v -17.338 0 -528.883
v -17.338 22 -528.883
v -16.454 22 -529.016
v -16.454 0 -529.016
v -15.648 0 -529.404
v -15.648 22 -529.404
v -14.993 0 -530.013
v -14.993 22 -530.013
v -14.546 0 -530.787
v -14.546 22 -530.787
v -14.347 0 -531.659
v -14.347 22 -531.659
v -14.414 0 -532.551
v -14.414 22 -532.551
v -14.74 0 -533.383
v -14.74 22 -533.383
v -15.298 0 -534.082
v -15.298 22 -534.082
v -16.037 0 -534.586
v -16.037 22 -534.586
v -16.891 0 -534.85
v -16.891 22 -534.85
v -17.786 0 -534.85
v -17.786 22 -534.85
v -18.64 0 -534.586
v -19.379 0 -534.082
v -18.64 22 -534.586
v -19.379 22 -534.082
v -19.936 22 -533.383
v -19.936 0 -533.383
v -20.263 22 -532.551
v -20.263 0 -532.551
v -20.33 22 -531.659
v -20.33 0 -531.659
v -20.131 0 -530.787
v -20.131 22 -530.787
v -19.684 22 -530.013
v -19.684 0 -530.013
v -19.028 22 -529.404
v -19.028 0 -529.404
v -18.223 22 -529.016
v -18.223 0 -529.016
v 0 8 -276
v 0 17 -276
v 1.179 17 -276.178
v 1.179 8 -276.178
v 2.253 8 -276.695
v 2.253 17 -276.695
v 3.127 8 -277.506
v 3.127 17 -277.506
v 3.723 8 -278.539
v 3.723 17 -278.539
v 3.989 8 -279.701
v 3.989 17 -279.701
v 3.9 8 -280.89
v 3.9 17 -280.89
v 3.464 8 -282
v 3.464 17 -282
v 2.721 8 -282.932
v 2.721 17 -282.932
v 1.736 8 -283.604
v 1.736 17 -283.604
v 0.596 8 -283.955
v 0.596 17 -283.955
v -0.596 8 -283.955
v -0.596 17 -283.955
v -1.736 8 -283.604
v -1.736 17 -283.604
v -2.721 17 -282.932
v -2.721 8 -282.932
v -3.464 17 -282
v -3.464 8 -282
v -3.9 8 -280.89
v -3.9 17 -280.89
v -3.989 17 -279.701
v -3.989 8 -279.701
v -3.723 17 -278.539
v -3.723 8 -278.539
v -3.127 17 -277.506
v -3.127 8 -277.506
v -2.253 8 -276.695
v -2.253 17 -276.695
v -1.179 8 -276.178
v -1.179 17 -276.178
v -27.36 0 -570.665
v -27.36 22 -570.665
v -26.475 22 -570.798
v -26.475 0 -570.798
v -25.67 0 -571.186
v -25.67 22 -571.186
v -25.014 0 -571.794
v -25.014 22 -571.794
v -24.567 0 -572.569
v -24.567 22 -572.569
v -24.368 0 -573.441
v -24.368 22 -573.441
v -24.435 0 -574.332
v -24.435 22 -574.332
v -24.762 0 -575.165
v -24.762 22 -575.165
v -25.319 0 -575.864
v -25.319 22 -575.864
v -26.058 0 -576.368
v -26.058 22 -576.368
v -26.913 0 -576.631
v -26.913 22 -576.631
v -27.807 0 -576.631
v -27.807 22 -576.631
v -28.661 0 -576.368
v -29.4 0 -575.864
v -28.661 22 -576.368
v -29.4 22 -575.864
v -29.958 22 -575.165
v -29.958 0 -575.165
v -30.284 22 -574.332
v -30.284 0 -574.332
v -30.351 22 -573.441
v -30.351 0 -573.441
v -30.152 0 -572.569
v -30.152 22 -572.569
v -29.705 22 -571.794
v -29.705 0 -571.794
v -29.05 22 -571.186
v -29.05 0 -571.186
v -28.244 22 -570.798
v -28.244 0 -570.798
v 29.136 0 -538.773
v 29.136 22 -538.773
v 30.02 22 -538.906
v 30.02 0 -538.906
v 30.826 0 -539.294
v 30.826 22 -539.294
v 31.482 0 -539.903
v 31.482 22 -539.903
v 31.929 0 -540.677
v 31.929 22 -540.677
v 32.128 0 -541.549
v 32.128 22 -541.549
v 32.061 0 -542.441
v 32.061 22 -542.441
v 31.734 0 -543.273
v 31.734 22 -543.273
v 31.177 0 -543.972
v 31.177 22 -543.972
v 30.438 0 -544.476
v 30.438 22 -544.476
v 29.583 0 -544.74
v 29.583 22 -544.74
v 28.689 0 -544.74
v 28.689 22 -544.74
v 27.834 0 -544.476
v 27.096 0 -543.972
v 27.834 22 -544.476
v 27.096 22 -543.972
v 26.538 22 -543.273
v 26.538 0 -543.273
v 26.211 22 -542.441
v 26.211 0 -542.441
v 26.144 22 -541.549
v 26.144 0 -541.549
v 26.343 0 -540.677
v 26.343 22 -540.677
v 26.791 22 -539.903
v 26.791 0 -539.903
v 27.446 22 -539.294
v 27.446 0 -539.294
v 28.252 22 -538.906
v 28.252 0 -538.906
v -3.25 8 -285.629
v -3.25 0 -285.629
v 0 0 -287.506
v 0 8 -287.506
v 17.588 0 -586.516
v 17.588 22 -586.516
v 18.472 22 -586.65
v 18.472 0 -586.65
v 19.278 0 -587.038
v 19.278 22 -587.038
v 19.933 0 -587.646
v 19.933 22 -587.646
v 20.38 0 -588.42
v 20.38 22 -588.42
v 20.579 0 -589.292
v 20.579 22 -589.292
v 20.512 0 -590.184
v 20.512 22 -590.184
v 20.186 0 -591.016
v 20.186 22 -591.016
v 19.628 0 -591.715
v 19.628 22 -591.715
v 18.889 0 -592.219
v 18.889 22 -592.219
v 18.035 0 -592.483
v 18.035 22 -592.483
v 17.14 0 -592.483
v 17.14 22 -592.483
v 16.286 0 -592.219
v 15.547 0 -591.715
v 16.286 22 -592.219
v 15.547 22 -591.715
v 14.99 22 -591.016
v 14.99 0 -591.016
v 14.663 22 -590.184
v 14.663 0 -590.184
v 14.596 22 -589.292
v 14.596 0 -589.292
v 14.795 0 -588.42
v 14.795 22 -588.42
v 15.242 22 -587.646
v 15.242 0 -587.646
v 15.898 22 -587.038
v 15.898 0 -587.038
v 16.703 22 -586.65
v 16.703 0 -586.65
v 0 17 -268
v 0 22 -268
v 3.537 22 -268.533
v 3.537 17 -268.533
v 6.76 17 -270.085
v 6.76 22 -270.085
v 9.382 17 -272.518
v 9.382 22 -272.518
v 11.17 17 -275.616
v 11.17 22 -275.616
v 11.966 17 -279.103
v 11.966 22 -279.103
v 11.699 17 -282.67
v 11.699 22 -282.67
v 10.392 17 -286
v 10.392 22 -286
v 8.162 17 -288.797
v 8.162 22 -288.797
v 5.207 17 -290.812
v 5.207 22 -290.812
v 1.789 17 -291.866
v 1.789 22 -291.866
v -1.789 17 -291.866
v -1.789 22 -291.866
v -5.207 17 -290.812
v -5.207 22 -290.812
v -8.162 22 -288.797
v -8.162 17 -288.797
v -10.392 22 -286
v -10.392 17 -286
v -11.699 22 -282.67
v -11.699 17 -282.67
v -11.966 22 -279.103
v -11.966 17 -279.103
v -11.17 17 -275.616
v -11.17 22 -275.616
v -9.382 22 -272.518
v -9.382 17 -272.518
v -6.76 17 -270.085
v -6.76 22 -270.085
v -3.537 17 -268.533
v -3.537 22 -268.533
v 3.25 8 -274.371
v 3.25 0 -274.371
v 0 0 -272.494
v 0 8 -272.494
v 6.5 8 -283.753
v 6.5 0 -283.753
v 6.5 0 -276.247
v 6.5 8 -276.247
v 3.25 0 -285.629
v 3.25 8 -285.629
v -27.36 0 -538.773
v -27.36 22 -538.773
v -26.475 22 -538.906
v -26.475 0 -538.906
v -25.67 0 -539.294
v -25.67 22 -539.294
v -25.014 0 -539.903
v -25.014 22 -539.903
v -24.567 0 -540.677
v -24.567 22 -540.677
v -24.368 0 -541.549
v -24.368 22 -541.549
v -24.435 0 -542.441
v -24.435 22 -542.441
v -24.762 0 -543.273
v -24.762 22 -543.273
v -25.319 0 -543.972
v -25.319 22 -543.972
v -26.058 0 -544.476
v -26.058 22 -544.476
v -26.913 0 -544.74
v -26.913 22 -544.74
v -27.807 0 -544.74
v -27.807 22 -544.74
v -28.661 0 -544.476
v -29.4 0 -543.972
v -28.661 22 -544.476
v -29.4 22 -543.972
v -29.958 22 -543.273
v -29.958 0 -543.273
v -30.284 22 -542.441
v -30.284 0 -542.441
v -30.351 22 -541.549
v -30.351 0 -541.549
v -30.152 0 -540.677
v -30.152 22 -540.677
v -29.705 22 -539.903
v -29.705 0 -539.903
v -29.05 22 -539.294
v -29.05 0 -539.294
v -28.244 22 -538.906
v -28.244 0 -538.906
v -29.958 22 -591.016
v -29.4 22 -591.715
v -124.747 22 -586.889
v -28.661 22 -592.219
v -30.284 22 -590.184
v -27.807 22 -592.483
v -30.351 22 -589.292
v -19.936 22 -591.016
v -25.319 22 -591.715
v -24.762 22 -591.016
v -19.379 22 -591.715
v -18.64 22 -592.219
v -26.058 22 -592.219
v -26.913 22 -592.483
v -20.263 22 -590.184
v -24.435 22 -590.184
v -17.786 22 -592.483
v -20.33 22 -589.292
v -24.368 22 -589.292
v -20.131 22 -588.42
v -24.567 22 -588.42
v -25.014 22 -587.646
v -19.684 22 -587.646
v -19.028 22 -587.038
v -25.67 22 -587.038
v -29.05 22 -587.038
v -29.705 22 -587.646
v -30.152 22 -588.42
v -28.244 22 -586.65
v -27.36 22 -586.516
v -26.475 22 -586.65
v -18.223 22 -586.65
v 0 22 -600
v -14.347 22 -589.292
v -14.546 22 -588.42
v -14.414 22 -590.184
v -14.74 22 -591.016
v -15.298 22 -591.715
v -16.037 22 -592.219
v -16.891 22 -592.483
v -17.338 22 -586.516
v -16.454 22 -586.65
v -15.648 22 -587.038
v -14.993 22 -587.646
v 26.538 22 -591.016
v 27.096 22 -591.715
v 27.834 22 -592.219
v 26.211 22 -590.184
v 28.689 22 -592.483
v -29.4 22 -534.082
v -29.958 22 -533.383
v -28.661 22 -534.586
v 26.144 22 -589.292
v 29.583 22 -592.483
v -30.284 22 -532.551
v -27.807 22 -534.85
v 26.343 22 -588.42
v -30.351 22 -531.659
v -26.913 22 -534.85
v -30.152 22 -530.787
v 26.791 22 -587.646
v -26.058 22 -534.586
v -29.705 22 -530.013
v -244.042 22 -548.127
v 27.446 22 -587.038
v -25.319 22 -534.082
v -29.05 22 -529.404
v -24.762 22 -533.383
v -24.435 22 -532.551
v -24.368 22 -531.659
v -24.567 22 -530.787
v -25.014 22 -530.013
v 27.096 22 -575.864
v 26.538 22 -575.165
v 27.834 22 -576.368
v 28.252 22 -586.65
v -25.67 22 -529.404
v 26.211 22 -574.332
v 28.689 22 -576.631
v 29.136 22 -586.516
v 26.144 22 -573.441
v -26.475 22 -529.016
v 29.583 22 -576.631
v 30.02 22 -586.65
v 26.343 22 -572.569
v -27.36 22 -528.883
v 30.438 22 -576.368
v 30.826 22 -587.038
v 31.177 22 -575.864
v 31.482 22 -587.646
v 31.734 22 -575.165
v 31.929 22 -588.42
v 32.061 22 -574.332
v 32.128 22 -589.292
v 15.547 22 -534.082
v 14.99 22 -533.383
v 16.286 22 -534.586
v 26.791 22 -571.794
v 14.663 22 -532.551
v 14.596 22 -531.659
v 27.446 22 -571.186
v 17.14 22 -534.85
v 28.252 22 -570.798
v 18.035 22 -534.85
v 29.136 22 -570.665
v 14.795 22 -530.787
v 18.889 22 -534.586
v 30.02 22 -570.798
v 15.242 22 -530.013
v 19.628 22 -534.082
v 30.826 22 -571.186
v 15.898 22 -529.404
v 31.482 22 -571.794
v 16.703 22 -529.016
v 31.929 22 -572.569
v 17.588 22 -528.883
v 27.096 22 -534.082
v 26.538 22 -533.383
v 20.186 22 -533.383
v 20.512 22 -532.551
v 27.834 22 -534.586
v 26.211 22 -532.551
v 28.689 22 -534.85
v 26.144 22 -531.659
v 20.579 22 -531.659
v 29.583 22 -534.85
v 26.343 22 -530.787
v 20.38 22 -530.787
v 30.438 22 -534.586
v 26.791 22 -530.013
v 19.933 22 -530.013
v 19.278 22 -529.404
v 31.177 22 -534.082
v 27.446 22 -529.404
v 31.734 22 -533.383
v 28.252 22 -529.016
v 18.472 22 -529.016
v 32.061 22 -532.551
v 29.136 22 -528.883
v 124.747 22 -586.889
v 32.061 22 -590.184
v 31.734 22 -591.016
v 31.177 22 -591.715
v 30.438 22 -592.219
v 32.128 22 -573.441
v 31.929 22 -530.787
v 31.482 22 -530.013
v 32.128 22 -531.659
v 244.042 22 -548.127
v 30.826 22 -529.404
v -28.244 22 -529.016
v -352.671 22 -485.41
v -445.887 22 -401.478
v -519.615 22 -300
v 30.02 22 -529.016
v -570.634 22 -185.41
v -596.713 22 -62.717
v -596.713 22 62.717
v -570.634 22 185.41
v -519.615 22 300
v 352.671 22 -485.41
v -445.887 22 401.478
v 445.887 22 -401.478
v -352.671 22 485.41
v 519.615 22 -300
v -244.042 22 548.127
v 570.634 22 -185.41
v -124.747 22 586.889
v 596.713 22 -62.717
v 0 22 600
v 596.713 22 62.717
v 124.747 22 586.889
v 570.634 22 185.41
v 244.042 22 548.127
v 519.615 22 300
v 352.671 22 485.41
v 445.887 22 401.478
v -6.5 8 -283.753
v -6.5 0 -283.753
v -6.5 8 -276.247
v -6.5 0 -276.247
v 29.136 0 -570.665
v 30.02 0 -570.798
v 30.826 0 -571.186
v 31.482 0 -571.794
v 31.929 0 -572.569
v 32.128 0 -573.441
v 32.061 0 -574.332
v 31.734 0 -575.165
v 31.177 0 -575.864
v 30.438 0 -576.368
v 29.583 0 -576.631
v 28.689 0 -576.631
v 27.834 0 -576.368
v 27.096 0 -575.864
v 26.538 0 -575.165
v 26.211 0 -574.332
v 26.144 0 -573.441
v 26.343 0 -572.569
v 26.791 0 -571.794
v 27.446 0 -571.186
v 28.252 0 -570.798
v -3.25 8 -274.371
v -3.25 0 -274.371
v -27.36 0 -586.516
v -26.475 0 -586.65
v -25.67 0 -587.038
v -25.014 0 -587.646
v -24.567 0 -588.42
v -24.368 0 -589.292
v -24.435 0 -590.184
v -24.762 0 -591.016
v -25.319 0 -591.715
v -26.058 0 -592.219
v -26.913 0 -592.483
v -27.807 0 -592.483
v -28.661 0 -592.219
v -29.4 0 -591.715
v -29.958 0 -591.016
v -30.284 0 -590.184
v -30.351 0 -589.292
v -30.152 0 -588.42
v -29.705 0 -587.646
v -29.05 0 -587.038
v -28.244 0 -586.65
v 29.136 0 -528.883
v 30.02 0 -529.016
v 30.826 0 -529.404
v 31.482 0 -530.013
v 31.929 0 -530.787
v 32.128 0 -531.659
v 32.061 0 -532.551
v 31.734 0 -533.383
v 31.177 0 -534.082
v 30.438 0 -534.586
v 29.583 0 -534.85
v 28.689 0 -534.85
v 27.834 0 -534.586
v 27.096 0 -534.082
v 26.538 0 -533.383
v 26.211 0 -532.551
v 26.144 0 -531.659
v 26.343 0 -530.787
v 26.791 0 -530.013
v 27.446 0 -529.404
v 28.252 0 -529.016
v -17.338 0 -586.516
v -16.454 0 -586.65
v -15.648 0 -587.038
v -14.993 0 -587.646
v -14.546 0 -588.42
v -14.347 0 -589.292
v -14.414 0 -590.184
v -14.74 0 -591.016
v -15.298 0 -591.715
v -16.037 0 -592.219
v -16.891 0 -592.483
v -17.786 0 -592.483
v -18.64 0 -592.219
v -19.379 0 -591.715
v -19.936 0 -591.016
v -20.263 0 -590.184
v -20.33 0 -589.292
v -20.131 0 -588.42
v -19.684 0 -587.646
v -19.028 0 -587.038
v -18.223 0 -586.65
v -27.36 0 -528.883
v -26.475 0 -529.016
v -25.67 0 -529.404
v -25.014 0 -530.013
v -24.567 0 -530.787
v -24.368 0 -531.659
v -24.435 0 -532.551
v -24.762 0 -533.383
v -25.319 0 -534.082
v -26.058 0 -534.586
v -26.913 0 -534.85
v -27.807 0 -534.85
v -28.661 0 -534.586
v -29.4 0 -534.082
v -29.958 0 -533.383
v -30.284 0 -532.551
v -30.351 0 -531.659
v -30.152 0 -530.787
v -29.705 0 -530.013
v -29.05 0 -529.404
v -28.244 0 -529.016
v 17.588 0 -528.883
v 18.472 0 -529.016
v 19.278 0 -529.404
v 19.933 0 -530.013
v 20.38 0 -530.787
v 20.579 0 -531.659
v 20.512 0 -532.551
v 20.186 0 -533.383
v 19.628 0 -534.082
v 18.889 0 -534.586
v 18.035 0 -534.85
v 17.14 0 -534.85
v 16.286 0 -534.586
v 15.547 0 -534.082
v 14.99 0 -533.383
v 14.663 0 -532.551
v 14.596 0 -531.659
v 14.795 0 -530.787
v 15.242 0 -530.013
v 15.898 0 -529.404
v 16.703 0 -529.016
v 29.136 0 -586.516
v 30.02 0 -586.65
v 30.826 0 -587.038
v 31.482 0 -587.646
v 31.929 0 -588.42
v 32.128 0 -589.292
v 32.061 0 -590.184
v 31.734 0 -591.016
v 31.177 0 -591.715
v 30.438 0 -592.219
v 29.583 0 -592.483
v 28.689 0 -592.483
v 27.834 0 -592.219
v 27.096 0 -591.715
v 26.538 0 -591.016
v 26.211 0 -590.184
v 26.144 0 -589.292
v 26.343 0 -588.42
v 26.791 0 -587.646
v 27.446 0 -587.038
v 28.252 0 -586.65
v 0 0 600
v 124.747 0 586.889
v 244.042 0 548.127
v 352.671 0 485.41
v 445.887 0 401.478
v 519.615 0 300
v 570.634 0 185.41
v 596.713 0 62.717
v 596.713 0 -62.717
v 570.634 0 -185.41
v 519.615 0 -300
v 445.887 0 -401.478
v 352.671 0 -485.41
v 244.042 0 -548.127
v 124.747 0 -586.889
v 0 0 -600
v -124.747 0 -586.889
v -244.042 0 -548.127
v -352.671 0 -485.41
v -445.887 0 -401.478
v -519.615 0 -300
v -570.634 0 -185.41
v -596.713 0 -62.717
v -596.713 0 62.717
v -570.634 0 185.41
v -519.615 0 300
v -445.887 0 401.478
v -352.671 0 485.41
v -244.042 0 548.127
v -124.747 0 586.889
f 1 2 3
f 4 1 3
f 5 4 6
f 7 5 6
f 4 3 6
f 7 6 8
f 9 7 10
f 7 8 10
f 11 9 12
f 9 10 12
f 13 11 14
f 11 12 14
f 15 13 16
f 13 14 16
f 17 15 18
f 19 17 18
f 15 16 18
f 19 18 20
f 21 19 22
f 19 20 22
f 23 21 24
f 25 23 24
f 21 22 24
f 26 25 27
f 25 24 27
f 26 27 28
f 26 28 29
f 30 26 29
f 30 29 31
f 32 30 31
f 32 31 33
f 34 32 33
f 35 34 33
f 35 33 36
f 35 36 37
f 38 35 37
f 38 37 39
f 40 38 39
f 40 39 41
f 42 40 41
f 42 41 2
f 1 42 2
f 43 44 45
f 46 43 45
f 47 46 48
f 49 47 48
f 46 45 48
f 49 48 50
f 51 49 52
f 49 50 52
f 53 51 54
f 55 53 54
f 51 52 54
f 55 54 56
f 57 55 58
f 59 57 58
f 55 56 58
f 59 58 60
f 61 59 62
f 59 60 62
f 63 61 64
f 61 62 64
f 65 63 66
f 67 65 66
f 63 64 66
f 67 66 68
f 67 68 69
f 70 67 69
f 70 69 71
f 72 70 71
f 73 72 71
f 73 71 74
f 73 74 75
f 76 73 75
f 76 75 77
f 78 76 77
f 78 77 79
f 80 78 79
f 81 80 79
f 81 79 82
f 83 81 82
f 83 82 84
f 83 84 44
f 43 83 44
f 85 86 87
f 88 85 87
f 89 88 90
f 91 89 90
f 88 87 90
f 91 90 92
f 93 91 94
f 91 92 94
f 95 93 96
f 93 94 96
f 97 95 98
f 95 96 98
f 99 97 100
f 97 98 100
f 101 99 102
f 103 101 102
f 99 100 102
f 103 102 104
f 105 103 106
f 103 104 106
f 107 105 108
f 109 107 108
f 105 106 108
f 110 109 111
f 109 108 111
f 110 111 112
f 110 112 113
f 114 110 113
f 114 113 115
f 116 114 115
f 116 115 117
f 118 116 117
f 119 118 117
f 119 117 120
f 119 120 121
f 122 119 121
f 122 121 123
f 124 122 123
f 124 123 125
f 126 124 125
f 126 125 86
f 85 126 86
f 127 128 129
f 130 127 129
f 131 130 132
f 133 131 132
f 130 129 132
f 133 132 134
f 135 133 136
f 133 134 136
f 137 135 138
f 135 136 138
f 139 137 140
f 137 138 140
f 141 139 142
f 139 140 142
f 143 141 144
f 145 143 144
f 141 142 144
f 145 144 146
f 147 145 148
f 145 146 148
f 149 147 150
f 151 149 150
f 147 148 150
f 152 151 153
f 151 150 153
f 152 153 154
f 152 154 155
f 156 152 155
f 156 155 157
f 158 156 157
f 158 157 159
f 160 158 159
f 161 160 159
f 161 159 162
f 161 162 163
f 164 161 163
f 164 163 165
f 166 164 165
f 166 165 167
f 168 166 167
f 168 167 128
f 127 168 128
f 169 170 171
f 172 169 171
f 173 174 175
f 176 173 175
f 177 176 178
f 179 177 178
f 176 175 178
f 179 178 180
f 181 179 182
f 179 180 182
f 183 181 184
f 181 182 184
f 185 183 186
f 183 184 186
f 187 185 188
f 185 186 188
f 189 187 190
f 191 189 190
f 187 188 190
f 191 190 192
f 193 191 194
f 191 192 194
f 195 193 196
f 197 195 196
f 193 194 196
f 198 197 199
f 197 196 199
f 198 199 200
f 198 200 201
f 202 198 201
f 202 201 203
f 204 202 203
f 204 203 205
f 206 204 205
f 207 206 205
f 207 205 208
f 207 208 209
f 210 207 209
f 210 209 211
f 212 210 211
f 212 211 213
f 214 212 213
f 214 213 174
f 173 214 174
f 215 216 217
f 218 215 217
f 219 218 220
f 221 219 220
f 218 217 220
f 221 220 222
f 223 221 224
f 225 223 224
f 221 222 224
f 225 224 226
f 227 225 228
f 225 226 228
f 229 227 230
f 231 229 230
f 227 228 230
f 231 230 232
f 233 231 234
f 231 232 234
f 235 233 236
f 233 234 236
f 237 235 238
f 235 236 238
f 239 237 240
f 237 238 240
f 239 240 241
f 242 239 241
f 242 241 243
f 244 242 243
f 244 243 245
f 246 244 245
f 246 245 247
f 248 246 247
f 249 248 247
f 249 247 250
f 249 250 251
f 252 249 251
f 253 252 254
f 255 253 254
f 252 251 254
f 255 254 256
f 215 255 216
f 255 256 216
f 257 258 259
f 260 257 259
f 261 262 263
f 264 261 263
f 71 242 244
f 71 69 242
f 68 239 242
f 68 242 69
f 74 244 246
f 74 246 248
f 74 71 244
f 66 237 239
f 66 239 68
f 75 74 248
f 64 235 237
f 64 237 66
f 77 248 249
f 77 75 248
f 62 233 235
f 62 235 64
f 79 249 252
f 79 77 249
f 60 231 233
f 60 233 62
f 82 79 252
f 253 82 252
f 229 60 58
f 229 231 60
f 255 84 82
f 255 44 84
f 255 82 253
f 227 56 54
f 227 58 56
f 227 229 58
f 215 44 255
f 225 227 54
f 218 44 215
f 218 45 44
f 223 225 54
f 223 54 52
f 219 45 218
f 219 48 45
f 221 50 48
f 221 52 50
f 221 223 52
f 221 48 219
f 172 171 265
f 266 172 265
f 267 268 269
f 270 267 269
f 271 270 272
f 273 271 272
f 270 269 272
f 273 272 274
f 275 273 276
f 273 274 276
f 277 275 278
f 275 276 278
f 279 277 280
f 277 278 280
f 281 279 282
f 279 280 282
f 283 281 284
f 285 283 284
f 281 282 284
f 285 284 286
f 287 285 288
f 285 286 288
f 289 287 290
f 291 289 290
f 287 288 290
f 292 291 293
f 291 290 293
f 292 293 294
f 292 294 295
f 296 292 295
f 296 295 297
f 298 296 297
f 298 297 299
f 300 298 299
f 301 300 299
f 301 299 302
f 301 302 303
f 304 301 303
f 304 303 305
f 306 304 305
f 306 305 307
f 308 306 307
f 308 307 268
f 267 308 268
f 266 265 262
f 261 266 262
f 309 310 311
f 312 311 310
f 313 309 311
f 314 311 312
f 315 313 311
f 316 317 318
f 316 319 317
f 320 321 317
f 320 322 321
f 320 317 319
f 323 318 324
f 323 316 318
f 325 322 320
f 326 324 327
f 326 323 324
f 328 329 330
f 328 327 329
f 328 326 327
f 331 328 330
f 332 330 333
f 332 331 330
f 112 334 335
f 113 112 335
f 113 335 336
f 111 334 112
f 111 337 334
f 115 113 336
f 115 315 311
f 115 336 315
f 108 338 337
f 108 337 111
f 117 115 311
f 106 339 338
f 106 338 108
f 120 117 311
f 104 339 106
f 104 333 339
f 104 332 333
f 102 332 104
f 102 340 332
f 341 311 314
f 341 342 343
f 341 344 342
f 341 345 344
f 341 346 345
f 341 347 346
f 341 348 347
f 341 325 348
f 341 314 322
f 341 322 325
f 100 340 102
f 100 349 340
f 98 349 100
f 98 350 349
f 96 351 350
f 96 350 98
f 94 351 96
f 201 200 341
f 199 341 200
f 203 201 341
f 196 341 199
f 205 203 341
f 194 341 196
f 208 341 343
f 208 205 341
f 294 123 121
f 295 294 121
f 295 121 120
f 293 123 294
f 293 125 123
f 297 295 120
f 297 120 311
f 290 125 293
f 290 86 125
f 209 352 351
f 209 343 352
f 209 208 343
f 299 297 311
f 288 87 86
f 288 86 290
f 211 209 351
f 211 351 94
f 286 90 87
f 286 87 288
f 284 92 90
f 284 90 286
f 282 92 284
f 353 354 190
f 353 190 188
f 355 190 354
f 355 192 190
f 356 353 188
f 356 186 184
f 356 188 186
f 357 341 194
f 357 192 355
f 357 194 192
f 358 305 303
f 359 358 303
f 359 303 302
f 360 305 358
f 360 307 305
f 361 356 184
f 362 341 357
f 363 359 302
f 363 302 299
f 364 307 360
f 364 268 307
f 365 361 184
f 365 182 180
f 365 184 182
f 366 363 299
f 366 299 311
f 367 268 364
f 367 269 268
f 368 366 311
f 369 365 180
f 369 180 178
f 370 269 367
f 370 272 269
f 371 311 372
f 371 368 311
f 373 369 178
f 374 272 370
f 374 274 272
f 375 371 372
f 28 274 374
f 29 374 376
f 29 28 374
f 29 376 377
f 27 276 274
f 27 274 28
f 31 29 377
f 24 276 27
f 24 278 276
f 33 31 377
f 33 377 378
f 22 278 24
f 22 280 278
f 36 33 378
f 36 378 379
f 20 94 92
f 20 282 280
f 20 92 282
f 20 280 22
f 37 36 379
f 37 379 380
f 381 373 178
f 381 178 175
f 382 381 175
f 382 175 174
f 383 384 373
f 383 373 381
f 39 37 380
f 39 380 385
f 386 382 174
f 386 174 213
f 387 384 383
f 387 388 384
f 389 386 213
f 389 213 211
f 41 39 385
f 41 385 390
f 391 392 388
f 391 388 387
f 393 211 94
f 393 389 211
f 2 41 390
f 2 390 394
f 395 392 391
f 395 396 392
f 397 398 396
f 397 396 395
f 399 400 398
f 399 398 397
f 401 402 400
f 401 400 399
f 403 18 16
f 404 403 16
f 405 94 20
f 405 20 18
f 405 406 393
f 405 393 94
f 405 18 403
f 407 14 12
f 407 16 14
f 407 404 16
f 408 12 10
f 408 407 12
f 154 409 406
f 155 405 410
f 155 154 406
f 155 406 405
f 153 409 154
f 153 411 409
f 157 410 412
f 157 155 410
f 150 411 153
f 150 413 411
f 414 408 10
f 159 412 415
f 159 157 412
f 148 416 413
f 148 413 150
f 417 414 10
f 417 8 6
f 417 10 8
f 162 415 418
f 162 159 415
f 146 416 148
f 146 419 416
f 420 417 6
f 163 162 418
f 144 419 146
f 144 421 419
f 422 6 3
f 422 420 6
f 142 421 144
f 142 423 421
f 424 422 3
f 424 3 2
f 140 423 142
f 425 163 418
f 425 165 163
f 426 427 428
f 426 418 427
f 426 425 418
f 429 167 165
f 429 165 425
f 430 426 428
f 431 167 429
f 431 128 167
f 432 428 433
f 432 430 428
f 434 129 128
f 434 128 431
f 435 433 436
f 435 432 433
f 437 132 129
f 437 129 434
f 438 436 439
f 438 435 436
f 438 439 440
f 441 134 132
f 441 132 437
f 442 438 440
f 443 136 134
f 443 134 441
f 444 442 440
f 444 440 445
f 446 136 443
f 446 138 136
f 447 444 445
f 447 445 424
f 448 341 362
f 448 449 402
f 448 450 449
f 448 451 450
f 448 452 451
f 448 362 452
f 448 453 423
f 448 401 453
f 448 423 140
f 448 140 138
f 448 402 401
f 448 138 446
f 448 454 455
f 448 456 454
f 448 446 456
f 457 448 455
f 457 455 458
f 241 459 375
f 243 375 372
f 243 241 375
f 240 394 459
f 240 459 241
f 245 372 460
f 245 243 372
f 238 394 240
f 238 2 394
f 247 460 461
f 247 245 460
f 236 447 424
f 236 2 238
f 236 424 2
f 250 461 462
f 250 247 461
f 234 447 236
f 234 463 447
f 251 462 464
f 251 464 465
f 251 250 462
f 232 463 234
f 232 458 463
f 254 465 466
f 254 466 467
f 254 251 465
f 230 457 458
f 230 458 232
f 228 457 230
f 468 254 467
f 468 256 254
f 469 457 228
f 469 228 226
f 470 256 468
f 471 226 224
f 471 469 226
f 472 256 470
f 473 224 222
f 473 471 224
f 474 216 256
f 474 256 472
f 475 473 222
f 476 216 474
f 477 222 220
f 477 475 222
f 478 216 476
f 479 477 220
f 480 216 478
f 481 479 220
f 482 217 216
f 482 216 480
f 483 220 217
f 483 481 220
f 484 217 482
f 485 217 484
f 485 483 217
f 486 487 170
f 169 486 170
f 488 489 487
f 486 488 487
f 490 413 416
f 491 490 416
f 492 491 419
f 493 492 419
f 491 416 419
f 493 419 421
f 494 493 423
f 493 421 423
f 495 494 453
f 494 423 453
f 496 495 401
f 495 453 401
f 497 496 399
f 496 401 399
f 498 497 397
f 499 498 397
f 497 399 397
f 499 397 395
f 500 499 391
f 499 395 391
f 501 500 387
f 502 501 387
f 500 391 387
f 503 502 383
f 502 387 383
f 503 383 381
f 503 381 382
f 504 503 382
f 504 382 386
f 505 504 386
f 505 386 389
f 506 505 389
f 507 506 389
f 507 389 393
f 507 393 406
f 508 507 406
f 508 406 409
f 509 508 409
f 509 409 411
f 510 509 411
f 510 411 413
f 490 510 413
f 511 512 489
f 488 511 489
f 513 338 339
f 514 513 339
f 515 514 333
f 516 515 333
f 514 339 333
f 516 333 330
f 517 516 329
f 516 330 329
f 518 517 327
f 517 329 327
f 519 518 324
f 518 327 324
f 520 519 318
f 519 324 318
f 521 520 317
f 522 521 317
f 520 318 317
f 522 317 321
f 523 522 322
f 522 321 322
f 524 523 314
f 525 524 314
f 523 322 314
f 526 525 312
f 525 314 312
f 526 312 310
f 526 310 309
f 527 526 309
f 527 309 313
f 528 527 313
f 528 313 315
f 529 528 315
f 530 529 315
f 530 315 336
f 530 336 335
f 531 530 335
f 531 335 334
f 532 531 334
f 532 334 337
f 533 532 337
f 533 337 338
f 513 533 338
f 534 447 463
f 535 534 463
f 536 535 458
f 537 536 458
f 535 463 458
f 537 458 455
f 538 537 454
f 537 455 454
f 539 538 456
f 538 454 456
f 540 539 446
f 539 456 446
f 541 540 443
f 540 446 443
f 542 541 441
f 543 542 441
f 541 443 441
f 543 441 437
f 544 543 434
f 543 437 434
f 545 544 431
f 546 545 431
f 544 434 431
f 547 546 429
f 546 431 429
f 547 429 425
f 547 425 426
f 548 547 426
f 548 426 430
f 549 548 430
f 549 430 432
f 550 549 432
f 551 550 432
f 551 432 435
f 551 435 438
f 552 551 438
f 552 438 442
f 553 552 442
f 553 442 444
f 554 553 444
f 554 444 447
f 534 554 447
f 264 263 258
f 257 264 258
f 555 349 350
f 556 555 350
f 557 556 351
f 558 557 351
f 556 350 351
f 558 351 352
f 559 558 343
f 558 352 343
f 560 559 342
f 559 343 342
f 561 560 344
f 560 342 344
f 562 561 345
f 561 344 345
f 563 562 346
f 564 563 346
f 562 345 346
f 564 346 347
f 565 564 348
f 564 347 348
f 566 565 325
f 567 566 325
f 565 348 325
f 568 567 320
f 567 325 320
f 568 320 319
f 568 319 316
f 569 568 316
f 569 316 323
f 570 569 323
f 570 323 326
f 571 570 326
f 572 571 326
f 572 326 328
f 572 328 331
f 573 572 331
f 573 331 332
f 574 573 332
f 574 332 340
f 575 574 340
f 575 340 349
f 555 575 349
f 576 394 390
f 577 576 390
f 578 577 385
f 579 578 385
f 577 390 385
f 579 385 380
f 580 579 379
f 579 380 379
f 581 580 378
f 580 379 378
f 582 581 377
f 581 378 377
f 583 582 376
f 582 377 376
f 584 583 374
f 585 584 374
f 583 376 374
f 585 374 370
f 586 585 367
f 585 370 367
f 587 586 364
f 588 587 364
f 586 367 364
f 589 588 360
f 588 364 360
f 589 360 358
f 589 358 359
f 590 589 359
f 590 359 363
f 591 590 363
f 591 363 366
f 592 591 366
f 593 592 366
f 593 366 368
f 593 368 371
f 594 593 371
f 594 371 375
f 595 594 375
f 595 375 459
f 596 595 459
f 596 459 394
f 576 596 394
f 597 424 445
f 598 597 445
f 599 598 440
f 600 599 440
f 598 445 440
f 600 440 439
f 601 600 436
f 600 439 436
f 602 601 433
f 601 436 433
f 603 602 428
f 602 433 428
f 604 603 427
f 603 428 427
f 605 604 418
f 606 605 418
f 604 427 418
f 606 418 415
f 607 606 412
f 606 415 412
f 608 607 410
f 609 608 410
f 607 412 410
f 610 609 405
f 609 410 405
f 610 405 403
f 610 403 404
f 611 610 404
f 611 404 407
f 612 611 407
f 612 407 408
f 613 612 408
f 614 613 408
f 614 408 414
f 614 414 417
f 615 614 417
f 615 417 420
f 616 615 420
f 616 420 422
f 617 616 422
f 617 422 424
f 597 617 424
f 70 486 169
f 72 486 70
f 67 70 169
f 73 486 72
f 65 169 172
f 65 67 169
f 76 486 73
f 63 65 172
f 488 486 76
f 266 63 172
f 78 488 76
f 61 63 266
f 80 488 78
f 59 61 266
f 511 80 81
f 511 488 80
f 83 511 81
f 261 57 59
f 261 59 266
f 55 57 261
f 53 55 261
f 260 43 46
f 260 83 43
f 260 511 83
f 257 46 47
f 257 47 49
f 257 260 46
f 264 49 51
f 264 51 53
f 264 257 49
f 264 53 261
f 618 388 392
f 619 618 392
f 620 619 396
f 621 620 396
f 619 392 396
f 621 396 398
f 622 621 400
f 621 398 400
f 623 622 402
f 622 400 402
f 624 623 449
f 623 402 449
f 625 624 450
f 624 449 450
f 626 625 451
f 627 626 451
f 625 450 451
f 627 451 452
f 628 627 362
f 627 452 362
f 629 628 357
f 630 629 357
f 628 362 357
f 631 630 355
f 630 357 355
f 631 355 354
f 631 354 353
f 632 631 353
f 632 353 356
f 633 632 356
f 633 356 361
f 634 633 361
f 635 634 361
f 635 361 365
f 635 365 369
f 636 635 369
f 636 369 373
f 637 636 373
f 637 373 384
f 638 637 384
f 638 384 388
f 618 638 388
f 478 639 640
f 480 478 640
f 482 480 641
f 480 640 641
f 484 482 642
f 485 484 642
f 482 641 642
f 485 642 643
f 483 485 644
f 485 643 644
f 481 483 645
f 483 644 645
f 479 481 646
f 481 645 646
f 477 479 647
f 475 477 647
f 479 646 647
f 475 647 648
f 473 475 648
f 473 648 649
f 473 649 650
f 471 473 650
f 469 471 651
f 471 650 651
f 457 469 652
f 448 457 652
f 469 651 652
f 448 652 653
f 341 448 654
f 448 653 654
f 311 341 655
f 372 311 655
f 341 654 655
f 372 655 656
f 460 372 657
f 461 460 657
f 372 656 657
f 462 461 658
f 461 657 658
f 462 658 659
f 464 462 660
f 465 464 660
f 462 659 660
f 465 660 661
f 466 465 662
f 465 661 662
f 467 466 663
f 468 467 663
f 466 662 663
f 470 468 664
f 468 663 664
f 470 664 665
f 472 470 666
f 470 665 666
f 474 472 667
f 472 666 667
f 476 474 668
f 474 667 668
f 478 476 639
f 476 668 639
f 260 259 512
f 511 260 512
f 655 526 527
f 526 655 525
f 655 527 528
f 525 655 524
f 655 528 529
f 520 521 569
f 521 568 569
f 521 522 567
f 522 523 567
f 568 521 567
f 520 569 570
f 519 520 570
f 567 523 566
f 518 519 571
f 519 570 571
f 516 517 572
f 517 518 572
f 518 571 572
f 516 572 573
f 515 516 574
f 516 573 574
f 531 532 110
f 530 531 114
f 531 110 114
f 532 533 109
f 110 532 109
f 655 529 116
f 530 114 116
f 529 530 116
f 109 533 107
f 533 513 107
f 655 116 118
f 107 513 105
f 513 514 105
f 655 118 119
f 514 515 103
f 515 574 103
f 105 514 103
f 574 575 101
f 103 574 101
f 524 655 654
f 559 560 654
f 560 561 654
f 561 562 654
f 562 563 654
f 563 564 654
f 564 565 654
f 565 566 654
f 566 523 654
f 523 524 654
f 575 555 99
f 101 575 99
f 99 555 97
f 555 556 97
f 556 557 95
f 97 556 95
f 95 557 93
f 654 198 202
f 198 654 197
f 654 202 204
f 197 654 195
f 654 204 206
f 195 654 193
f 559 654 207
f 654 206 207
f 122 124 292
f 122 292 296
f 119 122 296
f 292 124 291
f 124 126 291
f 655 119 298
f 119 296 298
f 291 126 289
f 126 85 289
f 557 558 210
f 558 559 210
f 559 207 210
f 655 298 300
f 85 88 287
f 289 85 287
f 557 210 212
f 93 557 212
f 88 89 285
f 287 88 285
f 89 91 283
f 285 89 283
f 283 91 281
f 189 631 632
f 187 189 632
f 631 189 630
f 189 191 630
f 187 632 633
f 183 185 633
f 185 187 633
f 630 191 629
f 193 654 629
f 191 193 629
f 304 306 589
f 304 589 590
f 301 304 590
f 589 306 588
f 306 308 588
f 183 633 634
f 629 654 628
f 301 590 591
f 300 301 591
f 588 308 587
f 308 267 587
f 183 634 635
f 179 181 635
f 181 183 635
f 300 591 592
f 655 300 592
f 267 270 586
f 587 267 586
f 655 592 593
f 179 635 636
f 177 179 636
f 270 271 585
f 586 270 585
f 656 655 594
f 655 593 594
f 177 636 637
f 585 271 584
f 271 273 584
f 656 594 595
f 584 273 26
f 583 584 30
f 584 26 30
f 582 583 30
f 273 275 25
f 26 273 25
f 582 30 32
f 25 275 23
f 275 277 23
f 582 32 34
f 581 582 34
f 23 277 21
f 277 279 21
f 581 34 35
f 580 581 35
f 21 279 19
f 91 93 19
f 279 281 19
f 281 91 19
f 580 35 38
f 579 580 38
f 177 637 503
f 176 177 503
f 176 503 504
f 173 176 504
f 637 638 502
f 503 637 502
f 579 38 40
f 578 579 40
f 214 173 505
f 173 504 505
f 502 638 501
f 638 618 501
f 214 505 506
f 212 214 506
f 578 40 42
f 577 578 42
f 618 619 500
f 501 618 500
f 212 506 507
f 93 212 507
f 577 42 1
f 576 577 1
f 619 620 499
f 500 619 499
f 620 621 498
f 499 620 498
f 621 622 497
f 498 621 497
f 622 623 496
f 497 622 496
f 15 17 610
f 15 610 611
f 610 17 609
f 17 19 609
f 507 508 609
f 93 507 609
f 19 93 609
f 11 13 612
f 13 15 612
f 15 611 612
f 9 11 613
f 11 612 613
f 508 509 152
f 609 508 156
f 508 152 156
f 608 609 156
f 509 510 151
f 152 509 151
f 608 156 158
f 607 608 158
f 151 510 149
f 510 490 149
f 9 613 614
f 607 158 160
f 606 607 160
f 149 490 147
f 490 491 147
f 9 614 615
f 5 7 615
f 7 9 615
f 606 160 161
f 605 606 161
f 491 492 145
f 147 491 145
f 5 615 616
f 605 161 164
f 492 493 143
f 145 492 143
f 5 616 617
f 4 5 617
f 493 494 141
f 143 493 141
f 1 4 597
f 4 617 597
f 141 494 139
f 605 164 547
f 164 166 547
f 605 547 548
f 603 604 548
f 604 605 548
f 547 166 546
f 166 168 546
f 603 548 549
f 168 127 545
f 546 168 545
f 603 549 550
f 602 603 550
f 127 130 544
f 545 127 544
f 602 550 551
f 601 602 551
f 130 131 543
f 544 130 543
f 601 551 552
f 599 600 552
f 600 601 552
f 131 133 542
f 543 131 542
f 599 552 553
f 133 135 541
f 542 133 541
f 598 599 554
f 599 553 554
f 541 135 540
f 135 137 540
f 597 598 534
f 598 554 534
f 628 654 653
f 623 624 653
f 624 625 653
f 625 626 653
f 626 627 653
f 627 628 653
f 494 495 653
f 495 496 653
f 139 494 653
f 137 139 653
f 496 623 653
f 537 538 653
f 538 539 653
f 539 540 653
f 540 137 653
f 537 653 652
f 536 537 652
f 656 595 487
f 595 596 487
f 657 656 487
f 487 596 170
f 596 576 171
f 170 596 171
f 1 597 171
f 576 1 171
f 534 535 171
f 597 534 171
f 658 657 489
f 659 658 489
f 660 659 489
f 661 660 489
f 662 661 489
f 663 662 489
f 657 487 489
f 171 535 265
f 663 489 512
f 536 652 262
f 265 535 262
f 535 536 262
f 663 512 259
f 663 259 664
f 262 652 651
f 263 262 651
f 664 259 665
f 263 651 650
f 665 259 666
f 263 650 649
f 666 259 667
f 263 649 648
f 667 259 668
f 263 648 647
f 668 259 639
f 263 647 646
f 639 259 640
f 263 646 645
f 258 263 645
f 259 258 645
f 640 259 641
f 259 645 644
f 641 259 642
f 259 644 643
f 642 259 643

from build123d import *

# Parameters (mm, degrees)
ESQUISSE1_R             = 600
BOSS_EXTRU_1_DEPTH      = 22
ESQUISSE2_R             = 4
ENL_V_MAT_EXTRU_1_DEPTH = 23
ENL_V_MAT_EXTRU_2_DEPTH = 8
ESQUISSE4_R             = 12
ENL_V_MAT_EXTRU_3_DEPTH = 5
ESQUISSE6_R             = 3
ENL_V_MAT_EXTRU_4_DEPTH = 23


with BuildPart() as part:
    # Esquisse1 → Boss.-Extru.1 (new body)
    with BuildSketch(Plane(origin=(0, 0, 0), x_dir=(1, 0, 0), z_dir=(0, 1, 0))):
        with Locations(Location((0, 0, 0), (0, 0, 270))):  # turned: the seam where the file's is
            Circle(ESQUISSE1_R)
    extrude(amount=BOSS_EXTRU_1_DEPTH)

    # Esquisse2 → Enlèv. mat.-Extru.1 (cut, through all)
    with BuildSketch(Plane(origin=(0, 22, 0), x_dir=(1, 0, 0), z_dir=(0, 1, 0))):
        with Locations(Location((0, 280, 0), (0, 0, 270))):  # turned: the seam where the file's is
            Circle(ESQUISSE2_R)
    extrude(amount=-ENL_V_MAT_EXTRU_1_DEPTH, mode=Mode.SUBTRACT)

    # Esquisse3 → Enlèv. mat.-Extru.2 (cut)
    with BuildSketch(Plane.XZ):
        Polygon((6.5, -280), (6.5, -276.24722325), (3.25, -274.370834875), (0, -272.494446501), (-3.25, -274.370834875), (-6.5, -276.24722325), (-6.5, -280), (-6.5, -283.75277675), (-3.25, -285.629165125), (0, -287.505553499), (3.25, -285.629165125), (6.5, -283.75277675), align=None)
    extrude(amount=-ENL_V_MAT_EXTRU_2_DEPTH, mode=Mode.SUBTRACT)

    # Esquisse4 → Enlèv. mat.-Extru.3 (cut)
    with BuildSketch(Plane(origin=(0, 22, 0), x_dir=(1, 0, 0), z_dir=(0, 1, 0))):
        with Locations(Location((0, 280, 0), (0, 0, 270))):  # turned: the seam where the file's is
            Circle(ESQUISSE4_R)
    extrude(amount=-ENL_V_MAT_EXTRU_3_DEPTH, mode=Mode.SUBTRACT)

    # Esquisse6 → Enlèv. mat.-Extru.4 (cut, through all)
    with BuildSketch(Plane(origin=(0, 22, 0), x_dir=(1, 0, 0), z_dir=(0, 1, 0))):
        with Locations(Location((-27.359707791, 541.773153337, 0), (0, 0, 270))):  # turned: the seam where the file's is
            Circle(ESQUISSE6_R)
        with Locations(Location((-27.359707791, 531.883070045, 0), (0, 0, 270))):  # turned: the seam where the file's is
            Circle(ESQUISSE6_R)
        with Locations(Location((-17.338422342, 531.883070045, 0), (0, 0, 270))):  # turned: the seam where the file's is
            Circle(ESQUISSE6_R)
        with Locations(Location((-27.359707791, 589.516341352, 0), (0, 0, 270))):  # turned: the seam where the file's is
            Circle(ESQUISSE6_R)
        with Locations(Location((-27.359707791, 573.664786381, 0), (0, 0, 270))):  # turned: the seam where the file's is
            Circle(ESQUISSE6_R)
        with Locations(Location((-17.338422342, 589.516341352, 0), (0, 0, 270))):  # turned: the seam where the file's is
            Circle(ESQUISSE6_R)
        with Locations(Location((17.587577233, 589.516341352, 0), (0, 0, 270))):  # turned: the seam where the file's is
            Circle(ESQUISSE6_R)
        with Locations(Location((29.13602426, 589.516341352, 0), (0, 0, 270))):  # turned: the seam where the file's is
            Circle(ESQUISSE6_R)
        with Locations(Location((29.13602426, 573.664786381, 0), (0, 0, 270))):  # turned: the seam where the file's is
            Circle(ESQUISSE6_R)
        with Locations(Location((29.13602426, 541.773153337, 0), (0, 0, 270))):  # turned: the seam where the file's is
            Circle(ESQUISSE6_R)
        with Locations(Location((29.13602426, 531.883070045, 0), (0, 0, 270))):  # turned: the seam where the file's is
            Circle(ESQUISSE6_R)
        with Locations(Location((17.587577233, 531.883070045, 0), (0, 0, 270))):  # turned: the seam where the file's is
            Circle(ESQUISSE6_R)
    extrude(amount=-ENL_V_MAT_EXTRU_4_DEPTH, mode=Mode.SUBTRACT)


solid = part.part
